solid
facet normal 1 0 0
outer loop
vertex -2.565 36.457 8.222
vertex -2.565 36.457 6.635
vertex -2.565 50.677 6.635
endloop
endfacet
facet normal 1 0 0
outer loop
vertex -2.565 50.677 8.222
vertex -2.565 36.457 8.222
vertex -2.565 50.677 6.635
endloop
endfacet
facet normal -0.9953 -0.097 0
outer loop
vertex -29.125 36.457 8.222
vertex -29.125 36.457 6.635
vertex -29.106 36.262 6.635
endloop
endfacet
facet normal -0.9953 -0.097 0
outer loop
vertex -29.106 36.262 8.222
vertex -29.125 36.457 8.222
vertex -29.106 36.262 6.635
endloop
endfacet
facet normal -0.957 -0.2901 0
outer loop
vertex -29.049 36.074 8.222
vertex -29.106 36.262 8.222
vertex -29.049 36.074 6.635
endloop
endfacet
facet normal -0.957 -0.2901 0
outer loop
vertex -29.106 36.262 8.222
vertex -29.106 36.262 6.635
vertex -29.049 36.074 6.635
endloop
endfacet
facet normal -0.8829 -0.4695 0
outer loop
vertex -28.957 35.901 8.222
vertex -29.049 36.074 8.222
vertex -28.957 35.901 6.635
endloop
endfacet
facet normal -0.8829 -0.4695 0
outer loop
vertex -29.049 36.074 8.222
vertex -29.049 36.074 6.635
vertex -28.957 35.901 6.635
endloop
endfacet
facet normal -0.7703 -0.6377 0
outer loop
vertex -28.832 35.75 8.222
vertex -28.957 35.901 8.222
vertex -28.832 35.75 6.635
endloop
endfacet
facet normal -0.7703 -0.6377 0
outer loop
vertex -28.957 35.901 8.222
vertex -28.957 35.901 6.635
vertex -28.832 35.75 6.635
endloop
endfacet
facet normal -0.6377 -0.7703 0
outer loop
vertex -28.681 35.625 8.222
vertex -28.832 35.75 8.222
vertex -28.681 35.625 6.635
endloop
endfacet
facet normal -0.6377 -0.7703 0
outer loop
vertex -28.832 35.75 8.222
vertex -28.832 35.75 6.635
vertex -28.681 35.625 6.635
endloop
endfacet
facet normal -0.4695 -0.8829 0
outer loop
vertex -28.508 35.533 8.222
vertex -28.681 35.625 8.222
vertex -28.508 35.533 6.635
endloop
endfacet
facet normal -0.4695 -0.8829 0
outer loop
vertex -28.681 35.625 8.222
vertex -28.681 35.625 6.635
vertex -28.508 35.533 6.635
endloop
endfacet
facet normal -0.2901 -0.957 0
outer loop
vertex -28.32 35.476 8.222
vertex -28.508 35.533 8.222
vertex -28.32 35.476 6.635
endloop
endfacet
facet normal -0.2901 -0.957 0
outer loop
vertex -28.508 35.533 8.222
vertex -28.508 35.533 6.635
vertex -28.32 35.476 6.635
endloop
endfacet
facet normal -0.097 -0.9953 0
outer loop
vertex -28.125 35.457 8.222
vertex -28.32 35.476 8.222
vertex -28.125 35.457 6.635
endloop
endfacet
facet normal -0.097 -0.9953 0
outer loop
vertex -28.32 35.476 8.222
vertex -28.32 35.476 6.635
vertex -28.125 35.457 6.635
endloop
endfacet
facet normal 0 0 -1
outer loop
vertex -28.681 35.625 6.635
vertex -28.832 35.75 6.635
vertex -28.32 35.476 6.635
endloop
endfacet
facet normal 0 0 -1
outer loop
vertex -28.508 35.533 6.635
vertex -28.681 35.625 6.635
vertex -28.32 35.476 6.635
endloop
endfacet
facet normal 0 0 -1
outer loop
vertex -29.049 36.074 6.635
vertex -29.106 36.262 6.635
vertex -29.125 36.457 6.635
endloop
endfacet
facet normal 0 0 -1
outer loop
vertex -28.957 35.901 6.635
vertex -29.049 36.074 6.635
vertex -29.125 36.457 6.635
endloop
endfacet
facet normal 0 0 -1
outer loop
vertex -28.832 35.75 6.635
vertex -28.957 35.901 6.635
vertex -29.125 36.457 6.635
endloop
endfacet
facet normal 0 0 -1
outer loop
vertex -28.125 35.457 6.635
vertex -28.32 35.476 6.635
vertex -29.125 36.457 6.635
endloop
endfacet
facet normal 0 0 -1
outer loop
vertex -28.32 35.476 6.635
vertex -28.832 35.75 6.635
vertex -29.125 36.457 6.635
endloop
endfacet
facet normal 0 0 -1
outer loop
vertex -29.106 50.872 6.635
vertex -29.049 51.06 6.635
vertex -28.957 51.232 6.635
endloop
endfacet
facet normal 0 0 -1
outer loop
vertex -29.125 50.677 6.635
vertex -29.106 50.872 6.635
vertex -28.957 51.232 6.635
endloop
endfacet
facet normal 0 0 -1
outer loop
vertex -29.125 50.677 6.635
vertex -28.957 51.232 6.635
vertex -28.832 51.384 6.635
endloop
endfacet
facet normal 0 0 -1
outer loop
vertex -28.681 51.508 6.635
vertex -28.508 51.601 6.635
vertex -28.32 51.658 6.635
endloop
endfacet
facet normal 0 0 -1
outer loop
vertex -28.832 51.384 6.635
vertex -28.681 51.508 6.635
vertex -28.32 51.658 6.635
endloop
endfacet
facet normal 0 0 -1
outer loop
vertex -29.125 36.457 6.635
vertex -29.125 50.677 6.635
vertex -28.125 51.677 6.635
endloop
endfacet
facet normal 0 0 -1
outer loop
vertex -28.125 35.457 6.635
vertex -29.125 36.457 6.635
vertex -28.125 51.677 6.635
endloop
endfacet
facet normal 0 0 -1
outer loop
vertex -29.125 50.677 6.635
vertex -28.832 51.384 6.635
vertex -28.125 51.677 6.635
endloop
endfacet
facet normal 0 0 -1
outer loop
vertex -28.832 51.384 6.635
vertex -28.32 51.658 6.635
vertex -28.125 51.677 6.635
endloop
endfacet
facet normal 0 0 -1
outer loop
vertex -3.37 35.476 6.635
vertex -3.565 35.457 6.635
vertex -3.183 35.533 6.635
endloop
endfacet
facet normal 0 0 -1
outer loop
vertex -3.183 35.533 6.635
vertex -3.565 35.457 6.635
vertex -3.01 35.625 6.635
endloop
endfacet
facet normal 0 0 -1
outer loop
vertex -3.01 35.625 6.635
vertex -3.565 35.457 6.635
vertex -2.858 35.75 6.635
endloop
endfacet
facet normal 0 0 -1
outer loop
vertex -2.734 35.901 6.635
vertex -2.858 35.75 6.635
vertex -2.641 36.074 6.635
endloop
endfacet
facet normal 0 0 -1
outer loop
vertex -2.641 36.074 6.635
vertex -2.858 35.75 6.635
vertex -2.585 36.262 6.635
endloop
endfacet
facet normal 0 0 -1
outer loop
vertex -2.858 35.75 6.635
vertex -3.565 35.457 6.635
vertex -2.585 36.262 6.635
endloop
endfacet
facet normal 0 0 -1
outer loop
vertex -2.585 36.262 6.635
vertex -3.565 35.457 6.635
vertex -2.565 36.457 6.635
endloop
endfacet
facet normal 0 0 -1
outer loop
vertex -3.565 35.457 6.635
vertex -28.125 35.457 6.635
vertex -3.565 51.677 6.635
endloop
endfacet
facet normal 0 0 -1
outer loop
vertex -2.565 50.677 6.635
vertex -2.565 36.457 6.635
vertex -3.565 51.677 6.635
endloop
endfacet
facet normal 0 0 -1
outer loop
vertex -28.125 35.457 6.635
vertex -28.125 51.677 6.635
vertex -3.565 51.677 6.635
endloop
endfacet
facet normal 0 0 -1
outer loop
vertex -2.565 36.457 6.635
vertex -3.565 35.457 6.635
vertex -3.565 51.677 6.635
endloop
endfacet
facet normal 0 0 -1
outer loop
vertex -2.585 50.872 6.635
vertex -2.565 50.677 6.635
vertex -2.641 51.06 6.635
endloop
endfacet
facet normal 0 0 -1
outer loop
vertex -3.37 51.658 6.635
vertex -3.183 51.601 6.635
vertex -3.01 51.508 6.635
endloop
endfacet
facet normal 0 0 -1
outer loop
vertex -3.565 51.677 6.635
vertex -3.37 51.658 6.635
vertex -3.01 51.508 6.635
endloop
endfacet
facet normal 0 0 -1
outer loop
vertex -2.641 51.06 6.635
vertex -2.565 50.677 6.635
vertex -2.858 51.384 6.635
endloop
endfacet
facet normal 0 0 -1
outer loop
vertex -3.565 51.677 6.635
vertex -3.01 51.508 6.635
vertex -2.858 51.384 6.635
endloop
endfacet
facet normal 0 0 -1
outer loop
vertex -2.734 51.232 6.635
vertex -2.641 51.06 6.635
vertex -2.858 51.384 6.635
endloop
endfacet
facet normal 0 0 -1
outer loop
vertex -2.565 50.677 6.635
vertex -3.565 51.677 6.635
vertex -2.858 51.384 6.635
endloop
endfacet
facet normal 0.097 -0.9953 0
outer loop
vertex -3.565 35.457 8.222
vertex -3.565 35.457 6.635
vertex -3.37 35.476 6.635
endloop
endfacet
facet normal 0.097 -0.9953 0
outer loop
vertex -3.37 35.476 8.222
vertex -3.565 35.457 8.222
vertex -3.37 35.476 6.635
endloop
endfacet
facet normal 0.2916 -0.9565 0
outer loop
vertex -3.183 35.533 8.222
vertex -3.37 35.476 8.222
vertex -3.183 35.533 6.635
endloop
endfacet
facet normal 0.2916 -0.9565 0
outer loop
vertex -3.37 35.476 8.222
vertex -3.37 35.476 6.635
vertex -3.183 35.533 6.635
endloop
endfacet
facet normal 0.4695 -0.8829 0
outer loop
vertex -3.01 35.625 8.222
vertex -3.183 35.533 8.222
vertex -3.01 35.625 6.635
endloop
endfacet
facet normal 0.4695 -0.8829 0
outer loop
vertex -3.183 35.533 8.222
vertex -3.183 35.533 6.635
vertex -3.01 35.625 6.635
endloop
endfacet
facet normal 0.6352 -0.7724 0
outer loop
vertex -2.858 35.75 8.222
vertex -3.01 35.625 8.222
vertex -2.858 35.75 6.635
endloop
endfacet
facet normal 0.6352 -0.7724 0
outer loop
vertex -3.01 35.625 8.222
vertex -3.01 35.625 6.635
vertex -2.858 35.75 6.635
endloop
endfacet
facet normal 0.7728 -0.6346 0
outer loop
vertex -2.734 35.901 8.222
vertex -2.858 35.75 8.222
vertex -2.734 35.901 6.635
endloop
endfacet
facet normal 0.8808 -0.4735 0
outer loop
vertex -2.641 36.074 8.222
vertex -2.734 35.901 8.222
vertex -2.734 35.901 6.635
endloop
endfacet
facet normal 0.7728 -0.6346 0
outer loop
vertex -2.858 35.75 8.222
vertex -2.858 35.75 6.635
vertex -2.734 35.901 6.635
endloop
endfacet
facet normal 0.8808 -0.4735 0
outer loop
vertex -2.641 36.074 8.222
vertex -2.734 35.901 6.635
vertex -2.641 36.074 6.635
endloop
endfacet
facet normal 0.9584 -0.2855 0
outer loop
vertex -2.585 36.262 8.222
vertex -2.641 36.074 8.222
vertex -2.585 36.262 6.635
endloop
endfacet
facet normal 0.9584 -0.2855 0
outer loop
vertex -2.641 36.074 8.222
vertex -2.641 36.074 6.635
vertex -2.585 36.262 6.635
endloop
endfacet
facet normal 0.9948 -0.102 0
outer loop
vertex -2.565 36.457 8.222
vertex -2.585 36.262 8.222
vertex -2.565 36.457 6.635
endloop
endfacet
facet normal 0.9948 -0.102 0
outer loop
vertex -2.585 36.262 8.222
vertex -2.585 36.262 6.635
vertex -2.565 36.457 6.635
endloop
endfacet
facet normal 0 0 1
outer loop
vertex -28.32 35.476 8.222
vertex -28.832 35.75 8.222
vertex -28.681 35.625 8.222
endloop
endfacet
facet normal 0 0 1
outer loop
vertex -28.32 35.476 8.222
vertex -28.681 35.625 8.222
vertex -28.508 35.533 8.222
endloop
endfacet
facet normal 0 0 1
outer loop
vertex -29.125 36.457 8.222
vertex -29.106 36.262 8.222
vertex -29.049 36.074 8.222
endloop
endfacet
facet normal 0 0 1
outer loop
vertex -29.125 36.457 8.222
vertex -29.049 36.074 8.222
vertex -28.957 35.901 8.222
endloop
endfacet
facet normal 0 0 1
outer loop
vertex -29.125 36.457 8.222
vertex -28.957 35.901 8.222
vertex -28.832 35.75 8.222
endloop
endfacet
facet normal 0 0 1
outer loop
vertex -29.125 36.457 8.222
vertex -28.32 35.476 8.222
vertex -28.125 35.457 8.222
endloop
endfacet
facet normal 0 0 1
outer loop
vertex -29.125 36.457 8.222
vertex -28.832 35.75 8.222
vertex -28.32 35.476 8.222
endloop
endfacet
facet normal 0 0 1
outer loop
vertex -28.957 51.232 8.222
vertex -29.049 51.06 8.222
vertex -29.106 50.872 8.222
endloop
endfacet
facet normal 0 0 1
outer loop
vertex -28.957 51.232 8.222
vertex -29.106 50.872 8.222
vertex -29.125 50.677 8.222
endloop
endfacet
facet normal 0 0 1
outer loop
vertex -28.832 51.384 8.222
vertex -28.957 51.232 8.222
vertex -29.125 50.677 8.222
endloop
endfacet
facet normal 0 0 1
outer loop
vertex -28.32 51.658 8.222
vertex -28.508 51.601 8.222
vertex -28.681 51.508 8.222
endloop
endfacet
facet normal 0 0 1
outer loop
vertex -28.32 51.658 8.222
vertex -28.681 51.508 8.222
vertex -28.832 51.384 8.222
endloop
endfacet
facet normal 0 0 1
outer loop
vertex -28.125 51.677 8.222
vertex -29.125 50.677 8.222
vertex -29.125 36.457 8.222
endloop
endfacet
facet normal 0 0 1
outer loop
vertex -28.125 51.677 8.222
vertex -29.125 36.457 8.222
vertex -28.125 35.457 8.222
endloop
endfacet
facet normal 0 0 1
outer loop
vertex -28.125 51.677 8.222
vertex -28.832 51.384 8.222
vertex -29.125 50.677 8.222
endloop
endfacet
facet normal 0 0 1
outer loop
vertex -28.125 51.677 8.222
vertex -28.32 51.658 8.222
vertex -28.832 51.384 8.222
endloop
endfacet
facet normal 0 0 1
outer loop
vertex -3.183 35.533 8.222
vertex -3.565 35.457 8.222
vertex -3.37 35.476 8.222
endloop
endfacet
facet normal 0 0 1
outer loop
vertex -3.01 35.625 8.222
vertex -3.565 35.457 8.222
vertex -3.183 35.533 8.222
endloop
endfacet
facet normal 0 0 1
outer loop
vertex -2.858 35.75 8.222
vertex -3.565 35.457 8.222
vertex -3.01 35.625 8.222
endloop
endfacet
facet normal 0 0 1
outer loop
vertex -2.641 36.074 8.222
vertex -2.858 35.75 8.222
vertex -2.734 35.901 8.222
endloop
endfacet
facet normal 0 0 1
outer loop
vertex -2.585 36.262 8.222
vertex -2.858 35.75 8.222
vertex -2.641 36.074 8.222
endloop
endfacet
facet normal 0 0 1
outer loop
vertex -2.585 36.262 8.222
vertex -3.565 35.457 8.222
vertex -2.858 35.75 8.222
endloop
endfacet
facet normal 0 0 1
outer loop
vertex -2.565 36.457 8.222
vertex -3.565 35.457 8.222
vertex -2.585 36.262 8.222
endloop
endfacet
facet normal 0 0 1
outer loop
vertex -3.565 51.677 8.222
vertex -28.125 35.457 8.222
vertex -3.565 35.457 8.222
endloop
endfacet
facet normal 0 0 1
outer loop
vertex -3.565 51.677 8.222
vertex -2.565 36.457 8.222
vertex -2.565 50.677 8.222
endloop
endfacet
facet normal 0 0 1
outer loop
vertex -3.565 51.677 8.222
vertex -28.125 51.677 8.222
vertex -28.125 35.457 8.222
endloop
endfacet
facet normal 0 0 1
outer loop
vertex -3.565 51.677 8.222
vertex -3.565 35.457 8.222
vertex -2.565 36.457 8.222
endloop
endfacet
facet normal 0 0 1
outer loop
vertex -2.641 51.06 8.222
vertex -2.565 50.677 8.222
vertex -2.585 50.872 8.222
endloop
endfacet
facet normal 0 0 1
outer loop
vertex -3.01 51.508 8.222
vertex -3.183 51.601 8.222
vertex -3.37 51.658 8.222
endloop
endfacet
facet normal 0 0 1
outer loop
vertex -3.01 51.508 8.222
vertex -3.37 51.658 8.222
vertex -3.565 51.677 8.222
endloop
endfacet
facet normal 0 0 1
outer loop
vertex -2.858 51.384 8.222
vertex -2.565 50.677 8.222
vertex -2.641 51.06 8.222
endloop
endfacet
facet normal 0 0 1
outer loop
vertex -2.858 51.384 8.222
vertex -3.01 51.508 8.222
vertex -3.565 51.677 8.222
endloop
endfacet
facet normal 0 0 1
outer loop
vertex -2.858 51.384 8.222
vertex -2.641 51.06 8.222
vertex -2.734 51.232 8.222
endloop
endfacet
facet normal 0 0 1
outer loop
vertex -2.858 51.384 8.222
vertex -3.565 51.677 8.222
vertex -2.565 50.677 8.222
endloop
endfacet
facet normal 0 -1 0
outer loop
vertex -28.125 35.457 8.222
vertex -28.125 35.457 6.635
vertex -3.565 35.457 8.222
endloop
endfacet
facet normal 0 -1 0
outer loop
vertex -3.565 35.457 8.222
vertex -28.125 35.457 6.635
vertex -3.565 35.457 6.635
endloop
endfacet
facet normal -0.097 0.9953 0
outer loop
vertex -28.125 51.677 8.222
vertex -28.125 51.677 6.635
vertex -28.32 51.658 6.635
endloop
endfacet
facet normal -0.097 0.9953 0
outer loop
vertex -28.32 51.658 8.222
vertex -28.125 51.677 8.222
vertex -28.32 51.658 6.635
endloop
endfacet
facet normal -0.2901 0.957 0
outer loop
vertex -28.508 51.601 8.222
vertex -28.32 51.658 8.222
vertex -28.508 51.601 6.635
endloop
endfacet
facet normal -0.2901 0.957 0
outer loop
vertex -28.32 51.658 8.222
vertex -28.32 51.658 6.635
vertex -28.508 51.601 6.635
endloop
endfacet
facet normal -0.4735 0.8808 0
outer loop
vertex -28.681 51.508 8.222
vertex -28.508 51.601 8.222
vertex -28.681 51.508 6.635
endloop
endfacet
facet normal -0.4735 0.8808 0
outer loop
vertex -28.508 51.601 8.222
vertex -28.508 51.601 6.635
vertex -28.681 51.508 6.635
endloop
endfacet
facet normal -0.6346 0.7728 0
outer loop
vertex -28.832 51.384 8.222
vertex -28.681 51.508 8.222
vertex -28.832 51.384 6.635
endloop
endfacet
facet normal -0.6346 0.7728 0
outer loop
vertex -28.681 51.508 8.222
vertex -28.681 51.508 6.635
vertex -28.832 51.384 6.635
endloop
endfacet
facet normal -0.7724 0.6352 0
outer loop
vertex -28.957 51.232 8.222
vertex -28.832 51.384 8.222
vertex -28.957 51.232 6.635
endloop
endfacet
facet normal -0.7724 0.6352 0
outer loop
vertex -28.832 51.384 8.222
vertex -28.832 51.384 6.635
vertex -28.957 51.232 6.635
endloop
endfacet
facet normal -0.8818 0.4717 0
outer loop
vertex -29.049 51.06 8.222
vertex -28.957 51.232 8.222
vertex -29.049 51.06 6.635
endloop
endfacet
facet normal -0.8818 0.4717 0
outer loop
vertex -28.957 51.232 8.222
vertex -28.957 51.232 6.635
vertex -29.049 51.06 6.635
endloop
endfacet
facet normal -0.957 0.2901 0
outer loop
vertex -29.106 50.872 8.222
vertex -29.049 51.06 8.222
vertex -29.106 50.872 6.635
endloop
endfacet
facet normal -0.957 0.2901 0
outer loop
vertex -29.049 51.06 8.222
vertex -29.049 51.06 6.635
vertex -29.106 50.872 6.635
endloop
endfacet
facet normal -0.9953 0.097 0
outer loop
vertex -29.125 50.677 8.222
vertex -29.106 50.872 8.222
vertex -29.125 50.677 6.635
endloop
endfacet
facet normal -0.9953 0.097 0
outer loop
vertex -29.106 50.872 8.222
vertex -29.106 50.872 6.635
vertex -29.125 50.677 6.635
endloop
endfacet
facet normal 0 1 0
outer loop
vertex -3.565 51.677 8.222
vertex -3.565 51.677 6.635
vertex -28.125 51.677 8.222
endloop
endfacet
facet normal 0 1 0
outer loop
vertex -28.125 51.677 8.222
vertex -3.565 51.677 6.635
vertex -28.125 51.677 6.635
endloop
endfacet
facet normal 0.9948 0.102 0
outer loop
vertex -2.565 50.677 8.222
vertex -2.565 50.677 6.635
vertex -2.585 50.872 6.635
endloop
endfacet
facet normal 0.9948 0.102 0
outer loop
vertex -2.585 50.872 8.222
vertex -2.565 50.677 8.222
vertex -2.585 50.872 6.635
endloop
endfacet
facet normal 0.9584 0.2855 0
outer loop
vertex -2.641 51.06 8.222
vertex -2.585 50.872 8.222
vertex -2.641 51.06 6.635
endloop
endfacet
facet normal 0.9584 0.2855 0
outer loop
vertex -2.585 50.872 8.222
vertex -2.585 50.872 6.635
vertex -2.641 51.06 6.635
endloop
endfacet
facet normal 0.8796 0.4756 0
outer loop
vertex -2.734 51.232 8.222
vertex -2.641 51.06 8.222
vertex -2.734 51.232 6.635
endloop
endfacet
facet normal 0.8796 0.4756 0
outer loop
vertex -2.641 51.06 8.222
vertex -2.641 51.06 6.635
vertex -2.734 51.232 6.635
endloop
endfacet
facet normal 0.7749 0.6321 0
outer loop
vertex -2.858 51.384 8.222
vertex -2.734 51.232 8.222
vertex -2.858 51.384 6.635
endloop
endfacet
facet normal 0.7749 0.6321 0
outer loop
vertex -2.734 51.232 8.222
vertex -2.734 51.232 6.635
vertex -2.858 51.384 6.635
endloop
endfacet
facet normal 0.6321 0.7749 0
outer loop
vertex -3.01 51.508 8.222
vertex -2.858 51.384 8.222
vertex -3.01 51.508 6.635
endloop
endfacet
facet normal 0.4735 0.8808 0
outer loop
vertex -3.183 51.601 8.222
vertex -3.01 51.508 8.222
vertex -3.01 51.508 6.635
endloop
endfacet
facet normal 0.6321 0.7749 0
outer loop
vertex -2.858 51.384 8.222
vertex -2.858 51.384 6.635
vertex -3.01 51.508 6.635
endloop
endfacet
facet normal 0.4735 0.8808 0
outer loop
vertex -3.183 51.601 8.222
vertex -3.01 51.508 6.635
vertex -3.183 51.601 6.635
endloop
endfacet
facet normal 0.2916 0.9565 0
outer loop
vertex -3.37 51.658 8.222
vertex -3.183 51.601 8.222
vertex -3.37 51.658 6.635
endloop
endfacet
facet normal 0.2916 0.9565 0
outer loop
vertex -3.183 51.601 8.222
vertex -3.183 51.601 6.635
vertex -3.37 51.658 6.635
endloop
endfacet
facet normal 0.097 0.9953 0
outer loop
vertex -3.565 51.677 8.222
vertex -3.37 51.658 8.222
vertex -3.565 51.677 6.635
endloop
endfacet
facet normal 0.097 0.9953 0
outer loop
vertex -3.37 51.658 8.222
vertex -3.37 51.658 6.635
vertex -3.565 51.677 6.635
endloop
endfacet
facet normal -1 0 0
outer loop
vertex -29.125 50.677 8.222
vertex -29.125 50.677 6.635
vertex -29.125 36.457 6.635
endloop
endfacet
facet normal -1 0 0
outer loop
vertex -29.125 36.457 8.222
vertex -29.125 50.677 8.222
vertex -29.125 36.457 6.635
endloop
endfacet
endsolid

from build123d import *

# Parameters (mm, degrees)
BOSS_EXTRUDE1_START = 0.5
BOSS_EXTRUDE1_DEPTH = 1.5875


with BuildPart() as part:
    # Sketch1 → Boss-Extrude1 (new body)
    with BuildSketch(Plane.XY.offset(6.134999756).offset(BOSS_EXTRUDE1_START)):
        with BuildLine():
            Line((-3.565294436, 51.676898136), (-28.125294436, 51.676898136))
            ThreePointArc((-28.125294436, 51.676898136), (-28.832401217, 51.384004917), (-29.125294436, 50.676898136))
            Line((-29.125294436, 50.676898136), (-29.125294436, 36.456898136))
            ThreePointArc((-29.125294436, 36.456898136), (-28.832401217, 35.749791355), (-28.125294436, 35.456898136))
            Line((-28.125294436, 35.456898136), (-3.565294436, 35.456898136))
            ThreePointArc((-3.565294436, 35.456898136), (-2.858187655, 35.749791355), (-2.565294436, 36.456898136))
            Line((-2.565294436, 36.456898136), (-2.565294436, 50.676898136))
            ThreePointArc((-2.565294436, 50.676898136), (-2.858187655, 51.384004917), (-3.565294436, 51.676898136))
        make_face()
    extrude(amount=BOSS_EXTRUDE1_DEPTH)


solid = part.part
